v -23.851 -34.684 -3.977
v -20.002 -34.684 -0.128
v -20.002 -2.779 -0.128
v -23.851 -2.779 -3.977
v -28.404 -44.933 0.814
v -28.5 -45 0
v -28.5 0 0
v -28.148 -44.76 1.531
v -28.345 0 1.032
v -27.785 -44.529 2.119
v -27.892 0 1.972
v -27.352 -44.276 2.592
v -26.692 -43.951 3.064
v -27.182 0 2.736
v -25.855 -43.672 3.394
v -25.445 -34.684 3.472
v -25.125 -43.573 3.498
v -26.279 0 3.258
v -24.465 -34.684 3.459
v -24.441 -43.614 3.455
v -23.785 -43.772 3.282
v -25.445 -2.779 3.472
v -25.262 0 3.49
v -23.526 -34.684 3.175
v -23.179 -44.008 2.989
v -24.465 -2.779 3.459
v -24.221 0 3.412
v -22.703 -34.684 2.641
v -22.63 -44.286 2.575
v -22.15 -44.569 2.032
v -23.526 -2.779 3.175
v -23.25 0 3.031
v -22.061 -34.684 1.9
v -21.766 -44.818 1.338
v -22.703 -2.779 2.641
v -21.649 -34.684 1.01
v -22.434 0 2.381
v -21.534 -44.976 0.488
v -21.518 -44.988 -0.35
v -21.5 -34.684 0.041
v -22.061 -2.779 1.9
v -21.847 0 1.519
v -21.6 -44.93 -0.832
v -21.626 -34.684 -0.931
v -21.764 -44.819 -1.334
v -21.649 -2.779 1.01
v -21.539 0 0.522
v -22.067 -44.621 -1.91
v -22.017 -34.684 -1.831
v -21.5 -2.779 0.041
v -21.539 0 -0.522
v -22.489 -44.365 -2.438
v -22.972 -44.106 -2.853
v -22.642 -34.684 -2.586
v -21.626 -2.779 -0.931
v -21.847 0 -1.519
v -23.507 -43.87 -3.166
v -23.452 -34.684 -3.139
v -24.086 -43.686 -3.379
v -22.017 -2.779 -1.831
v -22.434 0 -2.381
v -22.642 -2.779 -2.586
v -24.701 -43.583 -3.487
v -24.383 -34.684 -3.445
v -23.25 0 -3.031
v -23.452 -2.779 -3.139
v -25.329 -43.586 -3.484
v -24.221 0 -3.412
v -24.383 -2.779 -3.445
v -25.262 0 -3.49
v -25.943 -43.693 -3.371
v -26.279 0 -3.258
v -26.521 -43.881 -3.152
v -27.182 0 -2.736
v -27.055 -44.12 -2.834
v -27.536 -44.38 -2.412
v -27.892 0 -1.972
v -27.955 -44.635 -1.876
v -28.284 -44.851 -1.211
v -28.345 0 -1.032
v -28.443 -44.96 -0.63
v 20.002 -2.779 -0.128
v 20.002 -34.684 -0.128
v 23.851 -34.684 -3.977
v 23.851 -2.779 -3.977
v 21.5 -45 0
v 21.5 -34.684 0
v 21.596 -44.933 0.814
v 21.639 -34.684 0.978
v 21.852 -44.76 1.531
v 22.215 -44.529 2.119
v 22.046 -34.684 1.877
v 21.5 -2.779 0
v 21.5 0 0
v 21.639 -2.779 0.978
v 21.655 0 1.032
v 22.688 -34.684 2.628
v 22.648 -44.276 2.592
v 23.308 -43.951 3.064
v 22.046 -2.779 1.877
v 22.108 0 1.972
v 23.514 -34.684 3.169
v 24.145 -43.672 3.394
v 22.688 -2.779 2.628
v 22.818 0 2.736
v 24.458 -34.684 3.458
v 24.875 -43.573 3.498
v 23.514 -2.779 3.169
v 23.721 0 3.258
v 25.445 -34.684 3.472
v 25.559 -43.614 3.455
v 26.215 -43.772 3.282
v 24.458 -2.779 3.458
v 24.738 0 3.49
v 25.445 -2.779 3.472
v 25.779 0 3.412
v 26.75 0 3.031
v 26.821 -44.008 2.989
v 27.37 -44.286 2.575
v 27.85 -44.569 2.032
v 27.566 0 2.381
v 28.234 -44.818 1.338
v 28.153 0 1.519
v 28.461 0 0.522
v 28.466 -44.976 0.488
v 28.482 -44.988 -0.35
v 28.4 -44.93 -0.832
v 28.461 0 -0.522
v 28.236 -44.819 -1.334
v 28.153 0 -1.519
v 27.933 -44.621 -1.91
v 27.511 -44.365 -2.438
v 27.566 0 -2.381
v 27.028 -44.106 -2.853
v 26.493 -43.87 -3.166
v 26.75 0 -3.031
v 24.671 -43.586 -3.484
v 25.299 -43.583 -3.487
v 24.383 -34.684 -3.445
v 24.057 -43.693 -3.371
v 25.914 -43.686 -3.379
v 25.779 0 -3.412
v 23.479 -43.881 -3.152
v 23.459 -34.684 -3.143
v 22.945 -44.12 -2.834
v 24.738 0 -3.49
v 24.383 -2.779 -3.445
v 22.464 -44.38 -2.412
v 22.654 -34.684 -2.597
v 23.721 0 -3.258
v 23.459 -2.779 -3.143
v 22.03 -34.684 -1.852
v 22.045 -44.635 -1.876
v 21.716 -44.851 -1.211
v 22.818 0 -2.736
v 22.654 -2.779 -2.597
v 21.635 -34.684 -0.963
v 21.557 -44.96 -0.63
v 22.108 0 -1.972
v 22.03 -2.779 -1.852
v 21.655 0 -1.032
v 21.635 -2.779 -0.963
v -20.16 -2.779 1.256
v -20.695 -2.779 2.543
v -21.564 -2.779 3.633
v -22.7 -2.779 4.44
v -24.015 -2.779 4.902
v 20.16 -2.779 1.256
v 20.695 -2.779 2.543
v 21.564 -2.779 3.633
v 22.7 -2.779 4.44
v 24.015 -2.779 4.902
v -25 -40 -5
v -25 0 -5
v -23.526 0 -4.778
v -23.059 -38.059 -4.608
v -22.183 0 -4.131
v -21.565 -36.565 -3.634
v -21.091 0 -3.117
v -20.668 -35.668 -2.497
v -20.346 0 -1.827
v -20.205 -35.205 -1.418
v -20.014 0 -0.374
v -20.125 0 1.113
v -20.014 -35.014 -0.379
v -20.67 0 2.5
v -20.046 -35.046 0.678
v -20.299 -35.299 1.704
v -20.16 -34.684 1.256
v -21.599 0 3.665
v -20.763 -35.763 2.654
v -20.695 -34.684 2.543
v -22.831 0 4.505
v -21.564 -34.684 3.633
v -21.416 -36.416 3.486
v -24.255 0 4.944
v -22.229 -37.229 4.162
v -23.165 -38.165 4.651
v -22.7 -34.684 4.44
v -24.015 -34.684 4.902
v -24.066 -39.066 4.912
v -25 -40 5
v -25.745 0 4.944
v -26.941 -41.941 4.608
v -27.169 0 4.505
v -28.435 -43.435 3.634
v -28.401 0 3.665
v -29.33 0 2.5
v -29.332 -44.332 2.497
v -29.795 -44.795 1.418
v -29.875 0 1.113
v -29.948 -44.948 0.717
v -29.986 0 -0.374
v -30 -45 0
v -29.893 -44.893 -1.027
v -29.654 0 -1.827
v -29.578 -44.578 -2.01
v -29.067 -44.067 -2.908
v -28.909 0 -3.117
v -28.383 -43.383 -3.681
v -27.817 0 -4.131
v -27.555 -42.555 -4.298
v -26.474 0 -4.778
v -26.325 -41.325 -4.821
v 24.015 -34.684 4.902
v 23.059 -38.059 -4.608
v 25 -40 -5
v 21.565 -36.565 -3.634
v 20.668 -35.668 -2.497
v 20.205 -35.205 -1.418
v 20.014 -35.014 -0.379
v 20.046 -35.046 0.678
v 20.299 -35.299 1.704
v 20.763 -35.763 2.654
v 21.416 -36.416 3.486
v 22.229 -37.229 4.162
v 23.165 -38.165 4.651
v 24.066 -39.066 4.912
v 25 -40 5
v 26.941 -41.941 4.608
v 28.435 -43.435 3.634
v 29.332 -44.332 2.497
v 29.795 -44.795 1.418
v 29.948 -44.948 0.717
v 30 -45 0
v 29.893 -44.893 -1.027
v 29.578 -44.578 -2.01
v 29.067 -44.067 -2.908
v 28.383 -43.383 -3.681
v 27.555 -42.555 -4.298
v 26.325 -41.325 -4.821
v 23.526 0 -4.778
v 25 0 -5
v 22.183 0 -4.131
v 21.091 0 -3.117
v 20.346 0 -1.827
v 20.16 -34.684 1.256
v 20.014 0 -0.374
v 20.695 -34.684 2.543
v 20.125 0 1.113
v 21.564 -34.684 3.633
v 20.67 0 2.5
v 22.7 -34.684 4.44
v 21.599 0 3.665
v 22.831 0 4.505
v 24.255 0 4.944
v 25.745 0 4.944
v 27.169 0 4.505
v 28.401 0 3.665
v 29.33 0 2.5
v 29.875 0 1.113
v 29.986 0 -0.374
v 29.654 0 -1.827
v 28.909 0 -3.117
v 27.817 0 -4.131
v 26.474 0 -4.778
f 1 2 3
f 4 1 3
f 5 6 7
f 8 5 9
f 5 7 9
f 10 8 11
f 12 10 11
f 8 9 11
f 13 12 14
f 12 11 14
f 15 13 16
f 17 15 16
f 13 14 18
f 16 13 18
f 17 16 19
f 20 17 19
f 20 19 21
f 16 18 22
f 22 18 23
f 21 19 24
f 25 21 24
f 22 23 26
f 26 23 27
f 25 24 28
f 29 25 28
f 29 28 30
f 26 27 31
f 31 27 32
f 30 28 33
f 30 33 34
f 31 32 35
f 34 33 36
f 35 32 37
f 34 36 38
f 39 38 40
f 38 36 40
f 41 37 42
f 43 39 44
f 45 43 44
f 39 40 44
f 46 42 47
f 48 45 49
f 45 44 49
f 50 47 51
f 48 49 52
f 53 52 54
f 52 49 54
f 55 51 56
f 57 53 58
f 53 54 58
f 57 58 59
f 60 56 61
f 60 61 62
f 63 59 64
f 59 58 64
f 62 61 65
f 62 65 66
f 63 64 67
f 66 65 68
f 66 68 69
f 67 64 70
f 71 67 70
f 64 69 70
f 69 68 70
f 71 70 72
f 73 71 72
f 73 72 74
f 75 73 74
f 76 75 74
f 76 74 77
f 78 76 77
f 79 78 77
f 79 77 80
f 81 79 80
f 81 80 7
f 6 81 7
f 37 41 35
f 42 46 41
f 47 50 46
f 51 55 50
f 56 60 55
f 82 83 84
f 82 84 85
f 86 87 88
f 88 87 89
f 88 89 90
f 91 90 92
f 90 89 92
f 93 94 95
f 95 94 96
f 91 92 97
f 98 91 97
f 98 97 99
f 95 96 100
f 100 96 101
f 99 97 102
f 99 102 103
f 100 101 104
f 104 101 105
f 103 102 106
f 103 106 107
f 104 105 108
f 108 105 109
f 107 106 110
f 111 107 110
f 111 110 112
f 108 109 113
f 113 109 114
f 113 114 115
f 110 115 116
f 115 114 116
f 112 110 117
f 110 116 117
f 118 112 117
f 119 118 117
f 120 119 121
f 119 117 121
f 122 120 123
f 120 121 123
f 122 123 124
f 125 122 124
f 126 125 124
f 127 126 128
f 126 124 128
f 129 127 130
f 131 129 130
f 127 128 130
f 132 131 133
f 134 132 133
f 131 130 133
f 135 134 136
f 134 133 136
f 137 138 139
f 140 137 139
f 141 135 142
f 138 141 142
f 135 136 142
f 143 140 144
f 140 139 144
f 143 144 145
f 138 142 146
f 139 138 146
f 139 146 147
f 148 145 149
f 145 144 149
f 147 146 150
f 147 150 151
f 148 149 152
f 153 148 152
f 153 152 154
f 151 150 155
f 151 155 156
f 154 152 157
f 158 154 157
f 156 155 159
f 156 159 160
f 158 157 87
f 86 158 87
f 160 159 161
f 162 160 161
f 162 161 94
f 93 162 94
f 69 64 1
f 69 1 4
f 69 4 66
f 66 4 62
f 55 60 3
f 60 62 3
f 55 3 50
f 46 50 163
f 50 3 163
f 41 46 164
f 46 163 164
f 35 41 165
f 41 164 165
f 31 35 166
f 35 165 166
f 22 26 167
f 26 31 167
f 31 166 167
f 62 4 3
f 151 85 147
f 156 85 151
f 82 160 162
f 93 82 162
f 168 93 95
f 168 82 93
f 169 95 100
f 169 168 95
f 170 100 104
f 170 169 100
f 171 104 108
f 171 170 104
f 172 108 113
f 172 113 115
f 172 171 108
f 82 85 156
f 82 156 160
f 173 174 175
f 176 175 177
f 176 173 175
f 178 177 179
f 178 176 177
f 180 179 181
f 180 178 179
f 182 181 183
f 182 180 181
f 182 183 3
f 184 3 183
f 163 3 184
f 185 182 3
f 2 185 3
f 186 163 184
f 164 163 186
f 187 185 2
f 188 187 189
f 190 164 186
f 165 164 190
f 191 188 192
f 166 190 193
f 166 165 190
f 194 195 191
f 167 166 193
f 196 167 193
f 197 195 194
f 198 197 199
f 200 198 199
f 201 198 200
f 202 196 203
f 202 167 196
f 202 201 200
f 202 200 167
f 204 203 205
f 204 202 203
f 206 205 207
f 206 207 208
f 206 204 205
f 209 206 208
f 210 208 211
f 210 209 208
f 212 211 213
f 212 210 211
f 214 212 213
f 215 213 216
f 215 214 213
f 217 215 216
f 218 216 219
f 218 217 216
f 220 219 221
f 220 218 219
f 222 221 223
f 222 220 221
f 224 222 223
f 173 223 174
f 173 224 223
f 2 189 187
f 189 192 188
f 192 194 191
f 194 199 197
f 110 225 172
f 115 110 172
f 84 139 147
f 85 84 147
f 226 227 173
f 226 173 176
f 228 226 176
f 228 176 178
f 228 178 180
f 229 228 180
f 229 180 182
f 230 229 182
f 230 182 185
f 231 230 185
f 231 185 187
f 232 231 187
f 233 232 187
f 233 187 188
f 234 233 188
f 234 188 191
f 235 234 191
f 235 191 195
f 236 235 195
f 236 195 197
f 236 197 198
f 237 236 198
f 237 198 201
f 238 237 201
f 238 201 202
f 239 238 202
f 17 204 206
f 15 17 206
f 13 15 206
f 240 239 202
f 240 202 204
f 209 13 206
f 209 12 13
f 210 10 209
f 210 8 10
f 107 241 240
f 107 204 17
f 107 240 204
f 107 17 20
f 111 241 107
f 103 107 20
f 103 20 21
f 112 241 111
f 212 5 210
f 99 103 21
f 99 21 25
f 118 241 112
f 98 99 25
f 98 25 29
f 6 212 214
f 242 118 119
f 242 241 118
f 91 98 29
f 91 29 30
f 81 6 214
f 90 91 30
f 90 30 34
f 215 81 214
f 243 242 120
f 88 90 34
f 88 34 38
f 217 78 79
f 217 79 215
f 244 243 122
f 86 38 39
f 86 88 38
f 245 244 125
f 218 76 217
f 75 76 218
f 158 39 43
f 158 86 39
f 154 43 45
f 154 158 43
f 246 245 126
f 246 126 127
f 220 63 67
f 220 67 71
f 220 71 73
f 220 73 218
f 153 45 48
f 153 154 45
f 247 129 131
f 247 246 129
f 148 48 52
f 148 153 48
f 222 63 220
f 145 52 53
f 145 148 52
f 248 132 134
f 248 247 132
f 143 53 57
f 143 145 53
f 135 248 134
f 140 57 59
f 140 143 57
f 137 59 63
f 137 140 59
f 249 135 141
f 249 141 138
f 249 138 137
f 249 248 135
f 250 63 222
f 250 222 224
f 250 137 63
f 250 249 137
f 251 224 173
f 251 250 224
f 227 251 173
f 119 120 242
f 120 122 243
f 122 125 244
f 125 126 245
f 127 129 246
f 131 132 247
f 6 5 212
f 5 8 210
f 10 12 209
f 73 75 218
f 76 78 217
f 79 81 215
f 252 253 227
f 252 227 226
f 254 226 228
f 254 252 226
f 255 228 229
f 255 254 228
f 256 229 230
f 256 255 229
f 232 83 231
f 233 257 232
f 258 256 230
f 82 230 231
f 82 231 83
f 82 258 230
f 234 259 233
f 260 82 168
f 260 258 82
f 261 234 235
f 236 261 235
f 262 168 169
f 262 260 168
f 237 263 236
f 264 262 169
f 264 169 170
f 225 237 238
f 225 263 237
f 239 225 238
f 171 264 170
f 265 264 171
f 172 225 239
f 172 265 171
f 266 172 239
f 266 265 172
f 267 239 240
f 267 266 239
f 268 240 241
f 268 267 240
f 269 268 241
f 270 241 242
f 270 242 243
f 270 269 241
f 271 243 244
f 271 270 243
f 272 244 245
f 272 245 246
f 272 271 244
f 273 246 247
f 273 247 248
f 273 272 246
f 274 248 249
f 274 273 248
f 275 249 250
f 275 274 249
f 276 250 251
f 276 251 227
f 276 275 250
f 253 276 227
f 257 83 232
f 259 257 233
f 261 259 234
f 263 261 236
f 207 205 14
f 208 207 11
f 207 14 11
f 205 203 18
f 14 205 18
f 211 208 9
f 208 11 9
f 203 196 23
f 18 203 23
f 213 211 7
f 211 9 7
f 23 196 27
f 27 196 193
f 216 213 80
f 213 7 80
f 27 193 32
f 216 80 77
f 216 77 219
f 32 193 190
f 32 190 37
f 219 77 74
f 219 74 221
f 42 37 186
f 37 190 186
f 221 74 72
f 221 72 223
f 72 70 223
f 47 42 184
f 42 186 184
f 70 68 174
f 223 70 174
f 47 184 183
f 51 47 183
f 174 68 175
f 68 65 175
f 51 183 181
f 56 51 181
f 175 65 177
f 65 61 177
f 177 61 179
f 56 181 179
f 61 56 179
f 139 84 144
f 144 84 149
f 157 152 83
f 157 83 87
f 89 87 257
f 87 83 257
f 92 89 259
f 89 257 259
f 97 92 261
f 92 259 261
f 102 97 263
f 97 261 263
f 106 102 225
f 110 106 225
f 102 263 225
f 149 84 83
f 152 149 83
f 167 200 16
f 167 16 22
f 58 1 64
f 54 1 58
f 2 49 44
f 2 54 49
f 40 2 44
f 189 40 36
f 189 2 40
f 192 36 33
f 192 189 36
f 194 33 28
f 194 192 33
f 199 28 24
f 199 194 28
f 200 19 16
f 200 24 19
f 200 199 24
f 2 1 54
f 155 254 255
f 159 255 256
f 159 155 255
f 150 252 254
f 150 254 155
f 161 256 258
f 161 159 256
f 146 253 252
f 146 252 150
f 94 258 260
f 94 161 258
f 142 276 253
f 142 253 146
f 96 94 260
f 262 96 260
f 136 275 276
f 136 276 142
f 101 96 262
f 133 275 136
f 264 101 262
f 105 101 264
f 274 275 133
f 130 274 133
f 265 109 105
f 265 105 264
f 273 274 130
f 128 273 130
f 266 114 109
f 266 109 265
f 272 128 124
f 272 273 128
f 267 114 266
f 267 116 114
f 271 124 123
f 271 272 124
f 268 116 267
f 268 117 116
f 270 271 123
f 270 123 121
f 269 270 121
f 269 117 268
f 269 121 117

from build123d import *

# Parameters (mm, degrees)
SWEEP1_PROFILE_R                           = 5
SKETCH17_R                                 = 3.5
CUT_EXTRUDE1_DEPTH                         = 55.313902456
SKETCH18_W                                 = 31.905055519
SKETCH18_H                                 = 6.394424732
CUT_EXTRUDE2_DEPTH                         = 7
MIRROR1_AT_THE_SECOND_PLANE_COPY_1_SKETC_W = 31.905055519
MIRROR1_AT_THE_SECOND_PLANE_COPY_1_SKETC_H = 6.394424732
MIRROR1_AT_THE_SECOND_PLANE_COPY_1_DEPTH   = 7


with BuildPart() as part:
    # Sweep1: sweep along a path in Sketch1
    with BuildLine(Plane.XY) as sweep1_path:
        Line((-25, 0), (-25, -40))
        Line((-25, -40), (0, -40))
        Line((0, -40), (25, -40))
        Line((25, -40), (25, 0))
    # Sweep1 profile (on start of the path) → Sweep1 (sweep)
    with BuildSketch(Plane(origin=(-25, 0, 0), x_dir=(0, 0, -1), z_dir=(0, -1, 0))):
        Circle(SWEEP1_PROFILE_R)
    sweep(path=sweep1_path.line, transition=Transition.RIGHT)

    # Sketch17 → Cut-Extrude1 (cut, through all)
    with BuildSketch(Plane(origin=(0, 0, 0), x_dir=(1, 0, 0), z_dir=(0, 1, 0))):
        with Locations(Location((-25, 0, 0), (0, 0, 180))):
            Circle(SKETCH17_R)
        with Locations(Location((25, 0, 0), (0, 0, 180))):
            Circle(SKETCH17_R)
    extrude(amount=-CUT_EXTRUDE1_DEPTH, mode=Mode.SUBTRACT)

    # Sketch18 → Cut-Extrude2 (cut)
    with BuildSketch(Plane(origin=(-8.964466094, 0, -8.964466094), x_dir=(0, 1, 0), z_dir=(0.7071067811865488, 0, 0.7071067811865464))):
        with Locations((-18.731085844, 17.249970265)):
            Rectangle(SKETCH18_W, SKETCH18_H)
    cut_extrude2 = extrude(amount=-CUT_EXTRUDE2_DEPTH, mode=Mode.SUBTRACT)

    # Mirror1: Cut-Extrude2 across plane
    add(cut_extrude2.mirror(Plane(origin=(-8.964466094, 0, -8.964466094), x_dir=(-0.7071067811865465, 0, 0.7071067811865486), z_dir=(0.7071067811865488, 0, 0.7071067811865464))), mode=Mode.SUBTRACT)

    # Mirror1 at the second plane: Cut-Extrude2 across plane
    add(cut_extrude2.mirror(Plane(origin=(0, 0, 0), x_dir=(0, 0, 1), z_dir=(1, 0, 0))), mode=Mode.SUBTRACT)

    # Mirror1 at the second plane copy 1 sketc → Mirror1 at the second plane copy 1 (cut)
    with BuildSketch(Plane(origin=(8.964466094, 0, -8.964466094), x_dir=(0, 1, 0), z_dir=(0.707106781186549, 0, -0.7071067811865466))):
        with Locations((-18.731085844, 17.249970265)):
            Rectangle(MIRROR1_AT_THE_SECOND_PLANE_COPY_1_SKETC_W, MIRROR1_AT_THE_SECOND_PLANE_COPY_1_SKETC_H)
    extrude(amount=-MIRROR1_AT_THE_SECOND_PLANE_COPY_1_DEPTH, mode=Mode.SUBTRACT)


solid = part.part
